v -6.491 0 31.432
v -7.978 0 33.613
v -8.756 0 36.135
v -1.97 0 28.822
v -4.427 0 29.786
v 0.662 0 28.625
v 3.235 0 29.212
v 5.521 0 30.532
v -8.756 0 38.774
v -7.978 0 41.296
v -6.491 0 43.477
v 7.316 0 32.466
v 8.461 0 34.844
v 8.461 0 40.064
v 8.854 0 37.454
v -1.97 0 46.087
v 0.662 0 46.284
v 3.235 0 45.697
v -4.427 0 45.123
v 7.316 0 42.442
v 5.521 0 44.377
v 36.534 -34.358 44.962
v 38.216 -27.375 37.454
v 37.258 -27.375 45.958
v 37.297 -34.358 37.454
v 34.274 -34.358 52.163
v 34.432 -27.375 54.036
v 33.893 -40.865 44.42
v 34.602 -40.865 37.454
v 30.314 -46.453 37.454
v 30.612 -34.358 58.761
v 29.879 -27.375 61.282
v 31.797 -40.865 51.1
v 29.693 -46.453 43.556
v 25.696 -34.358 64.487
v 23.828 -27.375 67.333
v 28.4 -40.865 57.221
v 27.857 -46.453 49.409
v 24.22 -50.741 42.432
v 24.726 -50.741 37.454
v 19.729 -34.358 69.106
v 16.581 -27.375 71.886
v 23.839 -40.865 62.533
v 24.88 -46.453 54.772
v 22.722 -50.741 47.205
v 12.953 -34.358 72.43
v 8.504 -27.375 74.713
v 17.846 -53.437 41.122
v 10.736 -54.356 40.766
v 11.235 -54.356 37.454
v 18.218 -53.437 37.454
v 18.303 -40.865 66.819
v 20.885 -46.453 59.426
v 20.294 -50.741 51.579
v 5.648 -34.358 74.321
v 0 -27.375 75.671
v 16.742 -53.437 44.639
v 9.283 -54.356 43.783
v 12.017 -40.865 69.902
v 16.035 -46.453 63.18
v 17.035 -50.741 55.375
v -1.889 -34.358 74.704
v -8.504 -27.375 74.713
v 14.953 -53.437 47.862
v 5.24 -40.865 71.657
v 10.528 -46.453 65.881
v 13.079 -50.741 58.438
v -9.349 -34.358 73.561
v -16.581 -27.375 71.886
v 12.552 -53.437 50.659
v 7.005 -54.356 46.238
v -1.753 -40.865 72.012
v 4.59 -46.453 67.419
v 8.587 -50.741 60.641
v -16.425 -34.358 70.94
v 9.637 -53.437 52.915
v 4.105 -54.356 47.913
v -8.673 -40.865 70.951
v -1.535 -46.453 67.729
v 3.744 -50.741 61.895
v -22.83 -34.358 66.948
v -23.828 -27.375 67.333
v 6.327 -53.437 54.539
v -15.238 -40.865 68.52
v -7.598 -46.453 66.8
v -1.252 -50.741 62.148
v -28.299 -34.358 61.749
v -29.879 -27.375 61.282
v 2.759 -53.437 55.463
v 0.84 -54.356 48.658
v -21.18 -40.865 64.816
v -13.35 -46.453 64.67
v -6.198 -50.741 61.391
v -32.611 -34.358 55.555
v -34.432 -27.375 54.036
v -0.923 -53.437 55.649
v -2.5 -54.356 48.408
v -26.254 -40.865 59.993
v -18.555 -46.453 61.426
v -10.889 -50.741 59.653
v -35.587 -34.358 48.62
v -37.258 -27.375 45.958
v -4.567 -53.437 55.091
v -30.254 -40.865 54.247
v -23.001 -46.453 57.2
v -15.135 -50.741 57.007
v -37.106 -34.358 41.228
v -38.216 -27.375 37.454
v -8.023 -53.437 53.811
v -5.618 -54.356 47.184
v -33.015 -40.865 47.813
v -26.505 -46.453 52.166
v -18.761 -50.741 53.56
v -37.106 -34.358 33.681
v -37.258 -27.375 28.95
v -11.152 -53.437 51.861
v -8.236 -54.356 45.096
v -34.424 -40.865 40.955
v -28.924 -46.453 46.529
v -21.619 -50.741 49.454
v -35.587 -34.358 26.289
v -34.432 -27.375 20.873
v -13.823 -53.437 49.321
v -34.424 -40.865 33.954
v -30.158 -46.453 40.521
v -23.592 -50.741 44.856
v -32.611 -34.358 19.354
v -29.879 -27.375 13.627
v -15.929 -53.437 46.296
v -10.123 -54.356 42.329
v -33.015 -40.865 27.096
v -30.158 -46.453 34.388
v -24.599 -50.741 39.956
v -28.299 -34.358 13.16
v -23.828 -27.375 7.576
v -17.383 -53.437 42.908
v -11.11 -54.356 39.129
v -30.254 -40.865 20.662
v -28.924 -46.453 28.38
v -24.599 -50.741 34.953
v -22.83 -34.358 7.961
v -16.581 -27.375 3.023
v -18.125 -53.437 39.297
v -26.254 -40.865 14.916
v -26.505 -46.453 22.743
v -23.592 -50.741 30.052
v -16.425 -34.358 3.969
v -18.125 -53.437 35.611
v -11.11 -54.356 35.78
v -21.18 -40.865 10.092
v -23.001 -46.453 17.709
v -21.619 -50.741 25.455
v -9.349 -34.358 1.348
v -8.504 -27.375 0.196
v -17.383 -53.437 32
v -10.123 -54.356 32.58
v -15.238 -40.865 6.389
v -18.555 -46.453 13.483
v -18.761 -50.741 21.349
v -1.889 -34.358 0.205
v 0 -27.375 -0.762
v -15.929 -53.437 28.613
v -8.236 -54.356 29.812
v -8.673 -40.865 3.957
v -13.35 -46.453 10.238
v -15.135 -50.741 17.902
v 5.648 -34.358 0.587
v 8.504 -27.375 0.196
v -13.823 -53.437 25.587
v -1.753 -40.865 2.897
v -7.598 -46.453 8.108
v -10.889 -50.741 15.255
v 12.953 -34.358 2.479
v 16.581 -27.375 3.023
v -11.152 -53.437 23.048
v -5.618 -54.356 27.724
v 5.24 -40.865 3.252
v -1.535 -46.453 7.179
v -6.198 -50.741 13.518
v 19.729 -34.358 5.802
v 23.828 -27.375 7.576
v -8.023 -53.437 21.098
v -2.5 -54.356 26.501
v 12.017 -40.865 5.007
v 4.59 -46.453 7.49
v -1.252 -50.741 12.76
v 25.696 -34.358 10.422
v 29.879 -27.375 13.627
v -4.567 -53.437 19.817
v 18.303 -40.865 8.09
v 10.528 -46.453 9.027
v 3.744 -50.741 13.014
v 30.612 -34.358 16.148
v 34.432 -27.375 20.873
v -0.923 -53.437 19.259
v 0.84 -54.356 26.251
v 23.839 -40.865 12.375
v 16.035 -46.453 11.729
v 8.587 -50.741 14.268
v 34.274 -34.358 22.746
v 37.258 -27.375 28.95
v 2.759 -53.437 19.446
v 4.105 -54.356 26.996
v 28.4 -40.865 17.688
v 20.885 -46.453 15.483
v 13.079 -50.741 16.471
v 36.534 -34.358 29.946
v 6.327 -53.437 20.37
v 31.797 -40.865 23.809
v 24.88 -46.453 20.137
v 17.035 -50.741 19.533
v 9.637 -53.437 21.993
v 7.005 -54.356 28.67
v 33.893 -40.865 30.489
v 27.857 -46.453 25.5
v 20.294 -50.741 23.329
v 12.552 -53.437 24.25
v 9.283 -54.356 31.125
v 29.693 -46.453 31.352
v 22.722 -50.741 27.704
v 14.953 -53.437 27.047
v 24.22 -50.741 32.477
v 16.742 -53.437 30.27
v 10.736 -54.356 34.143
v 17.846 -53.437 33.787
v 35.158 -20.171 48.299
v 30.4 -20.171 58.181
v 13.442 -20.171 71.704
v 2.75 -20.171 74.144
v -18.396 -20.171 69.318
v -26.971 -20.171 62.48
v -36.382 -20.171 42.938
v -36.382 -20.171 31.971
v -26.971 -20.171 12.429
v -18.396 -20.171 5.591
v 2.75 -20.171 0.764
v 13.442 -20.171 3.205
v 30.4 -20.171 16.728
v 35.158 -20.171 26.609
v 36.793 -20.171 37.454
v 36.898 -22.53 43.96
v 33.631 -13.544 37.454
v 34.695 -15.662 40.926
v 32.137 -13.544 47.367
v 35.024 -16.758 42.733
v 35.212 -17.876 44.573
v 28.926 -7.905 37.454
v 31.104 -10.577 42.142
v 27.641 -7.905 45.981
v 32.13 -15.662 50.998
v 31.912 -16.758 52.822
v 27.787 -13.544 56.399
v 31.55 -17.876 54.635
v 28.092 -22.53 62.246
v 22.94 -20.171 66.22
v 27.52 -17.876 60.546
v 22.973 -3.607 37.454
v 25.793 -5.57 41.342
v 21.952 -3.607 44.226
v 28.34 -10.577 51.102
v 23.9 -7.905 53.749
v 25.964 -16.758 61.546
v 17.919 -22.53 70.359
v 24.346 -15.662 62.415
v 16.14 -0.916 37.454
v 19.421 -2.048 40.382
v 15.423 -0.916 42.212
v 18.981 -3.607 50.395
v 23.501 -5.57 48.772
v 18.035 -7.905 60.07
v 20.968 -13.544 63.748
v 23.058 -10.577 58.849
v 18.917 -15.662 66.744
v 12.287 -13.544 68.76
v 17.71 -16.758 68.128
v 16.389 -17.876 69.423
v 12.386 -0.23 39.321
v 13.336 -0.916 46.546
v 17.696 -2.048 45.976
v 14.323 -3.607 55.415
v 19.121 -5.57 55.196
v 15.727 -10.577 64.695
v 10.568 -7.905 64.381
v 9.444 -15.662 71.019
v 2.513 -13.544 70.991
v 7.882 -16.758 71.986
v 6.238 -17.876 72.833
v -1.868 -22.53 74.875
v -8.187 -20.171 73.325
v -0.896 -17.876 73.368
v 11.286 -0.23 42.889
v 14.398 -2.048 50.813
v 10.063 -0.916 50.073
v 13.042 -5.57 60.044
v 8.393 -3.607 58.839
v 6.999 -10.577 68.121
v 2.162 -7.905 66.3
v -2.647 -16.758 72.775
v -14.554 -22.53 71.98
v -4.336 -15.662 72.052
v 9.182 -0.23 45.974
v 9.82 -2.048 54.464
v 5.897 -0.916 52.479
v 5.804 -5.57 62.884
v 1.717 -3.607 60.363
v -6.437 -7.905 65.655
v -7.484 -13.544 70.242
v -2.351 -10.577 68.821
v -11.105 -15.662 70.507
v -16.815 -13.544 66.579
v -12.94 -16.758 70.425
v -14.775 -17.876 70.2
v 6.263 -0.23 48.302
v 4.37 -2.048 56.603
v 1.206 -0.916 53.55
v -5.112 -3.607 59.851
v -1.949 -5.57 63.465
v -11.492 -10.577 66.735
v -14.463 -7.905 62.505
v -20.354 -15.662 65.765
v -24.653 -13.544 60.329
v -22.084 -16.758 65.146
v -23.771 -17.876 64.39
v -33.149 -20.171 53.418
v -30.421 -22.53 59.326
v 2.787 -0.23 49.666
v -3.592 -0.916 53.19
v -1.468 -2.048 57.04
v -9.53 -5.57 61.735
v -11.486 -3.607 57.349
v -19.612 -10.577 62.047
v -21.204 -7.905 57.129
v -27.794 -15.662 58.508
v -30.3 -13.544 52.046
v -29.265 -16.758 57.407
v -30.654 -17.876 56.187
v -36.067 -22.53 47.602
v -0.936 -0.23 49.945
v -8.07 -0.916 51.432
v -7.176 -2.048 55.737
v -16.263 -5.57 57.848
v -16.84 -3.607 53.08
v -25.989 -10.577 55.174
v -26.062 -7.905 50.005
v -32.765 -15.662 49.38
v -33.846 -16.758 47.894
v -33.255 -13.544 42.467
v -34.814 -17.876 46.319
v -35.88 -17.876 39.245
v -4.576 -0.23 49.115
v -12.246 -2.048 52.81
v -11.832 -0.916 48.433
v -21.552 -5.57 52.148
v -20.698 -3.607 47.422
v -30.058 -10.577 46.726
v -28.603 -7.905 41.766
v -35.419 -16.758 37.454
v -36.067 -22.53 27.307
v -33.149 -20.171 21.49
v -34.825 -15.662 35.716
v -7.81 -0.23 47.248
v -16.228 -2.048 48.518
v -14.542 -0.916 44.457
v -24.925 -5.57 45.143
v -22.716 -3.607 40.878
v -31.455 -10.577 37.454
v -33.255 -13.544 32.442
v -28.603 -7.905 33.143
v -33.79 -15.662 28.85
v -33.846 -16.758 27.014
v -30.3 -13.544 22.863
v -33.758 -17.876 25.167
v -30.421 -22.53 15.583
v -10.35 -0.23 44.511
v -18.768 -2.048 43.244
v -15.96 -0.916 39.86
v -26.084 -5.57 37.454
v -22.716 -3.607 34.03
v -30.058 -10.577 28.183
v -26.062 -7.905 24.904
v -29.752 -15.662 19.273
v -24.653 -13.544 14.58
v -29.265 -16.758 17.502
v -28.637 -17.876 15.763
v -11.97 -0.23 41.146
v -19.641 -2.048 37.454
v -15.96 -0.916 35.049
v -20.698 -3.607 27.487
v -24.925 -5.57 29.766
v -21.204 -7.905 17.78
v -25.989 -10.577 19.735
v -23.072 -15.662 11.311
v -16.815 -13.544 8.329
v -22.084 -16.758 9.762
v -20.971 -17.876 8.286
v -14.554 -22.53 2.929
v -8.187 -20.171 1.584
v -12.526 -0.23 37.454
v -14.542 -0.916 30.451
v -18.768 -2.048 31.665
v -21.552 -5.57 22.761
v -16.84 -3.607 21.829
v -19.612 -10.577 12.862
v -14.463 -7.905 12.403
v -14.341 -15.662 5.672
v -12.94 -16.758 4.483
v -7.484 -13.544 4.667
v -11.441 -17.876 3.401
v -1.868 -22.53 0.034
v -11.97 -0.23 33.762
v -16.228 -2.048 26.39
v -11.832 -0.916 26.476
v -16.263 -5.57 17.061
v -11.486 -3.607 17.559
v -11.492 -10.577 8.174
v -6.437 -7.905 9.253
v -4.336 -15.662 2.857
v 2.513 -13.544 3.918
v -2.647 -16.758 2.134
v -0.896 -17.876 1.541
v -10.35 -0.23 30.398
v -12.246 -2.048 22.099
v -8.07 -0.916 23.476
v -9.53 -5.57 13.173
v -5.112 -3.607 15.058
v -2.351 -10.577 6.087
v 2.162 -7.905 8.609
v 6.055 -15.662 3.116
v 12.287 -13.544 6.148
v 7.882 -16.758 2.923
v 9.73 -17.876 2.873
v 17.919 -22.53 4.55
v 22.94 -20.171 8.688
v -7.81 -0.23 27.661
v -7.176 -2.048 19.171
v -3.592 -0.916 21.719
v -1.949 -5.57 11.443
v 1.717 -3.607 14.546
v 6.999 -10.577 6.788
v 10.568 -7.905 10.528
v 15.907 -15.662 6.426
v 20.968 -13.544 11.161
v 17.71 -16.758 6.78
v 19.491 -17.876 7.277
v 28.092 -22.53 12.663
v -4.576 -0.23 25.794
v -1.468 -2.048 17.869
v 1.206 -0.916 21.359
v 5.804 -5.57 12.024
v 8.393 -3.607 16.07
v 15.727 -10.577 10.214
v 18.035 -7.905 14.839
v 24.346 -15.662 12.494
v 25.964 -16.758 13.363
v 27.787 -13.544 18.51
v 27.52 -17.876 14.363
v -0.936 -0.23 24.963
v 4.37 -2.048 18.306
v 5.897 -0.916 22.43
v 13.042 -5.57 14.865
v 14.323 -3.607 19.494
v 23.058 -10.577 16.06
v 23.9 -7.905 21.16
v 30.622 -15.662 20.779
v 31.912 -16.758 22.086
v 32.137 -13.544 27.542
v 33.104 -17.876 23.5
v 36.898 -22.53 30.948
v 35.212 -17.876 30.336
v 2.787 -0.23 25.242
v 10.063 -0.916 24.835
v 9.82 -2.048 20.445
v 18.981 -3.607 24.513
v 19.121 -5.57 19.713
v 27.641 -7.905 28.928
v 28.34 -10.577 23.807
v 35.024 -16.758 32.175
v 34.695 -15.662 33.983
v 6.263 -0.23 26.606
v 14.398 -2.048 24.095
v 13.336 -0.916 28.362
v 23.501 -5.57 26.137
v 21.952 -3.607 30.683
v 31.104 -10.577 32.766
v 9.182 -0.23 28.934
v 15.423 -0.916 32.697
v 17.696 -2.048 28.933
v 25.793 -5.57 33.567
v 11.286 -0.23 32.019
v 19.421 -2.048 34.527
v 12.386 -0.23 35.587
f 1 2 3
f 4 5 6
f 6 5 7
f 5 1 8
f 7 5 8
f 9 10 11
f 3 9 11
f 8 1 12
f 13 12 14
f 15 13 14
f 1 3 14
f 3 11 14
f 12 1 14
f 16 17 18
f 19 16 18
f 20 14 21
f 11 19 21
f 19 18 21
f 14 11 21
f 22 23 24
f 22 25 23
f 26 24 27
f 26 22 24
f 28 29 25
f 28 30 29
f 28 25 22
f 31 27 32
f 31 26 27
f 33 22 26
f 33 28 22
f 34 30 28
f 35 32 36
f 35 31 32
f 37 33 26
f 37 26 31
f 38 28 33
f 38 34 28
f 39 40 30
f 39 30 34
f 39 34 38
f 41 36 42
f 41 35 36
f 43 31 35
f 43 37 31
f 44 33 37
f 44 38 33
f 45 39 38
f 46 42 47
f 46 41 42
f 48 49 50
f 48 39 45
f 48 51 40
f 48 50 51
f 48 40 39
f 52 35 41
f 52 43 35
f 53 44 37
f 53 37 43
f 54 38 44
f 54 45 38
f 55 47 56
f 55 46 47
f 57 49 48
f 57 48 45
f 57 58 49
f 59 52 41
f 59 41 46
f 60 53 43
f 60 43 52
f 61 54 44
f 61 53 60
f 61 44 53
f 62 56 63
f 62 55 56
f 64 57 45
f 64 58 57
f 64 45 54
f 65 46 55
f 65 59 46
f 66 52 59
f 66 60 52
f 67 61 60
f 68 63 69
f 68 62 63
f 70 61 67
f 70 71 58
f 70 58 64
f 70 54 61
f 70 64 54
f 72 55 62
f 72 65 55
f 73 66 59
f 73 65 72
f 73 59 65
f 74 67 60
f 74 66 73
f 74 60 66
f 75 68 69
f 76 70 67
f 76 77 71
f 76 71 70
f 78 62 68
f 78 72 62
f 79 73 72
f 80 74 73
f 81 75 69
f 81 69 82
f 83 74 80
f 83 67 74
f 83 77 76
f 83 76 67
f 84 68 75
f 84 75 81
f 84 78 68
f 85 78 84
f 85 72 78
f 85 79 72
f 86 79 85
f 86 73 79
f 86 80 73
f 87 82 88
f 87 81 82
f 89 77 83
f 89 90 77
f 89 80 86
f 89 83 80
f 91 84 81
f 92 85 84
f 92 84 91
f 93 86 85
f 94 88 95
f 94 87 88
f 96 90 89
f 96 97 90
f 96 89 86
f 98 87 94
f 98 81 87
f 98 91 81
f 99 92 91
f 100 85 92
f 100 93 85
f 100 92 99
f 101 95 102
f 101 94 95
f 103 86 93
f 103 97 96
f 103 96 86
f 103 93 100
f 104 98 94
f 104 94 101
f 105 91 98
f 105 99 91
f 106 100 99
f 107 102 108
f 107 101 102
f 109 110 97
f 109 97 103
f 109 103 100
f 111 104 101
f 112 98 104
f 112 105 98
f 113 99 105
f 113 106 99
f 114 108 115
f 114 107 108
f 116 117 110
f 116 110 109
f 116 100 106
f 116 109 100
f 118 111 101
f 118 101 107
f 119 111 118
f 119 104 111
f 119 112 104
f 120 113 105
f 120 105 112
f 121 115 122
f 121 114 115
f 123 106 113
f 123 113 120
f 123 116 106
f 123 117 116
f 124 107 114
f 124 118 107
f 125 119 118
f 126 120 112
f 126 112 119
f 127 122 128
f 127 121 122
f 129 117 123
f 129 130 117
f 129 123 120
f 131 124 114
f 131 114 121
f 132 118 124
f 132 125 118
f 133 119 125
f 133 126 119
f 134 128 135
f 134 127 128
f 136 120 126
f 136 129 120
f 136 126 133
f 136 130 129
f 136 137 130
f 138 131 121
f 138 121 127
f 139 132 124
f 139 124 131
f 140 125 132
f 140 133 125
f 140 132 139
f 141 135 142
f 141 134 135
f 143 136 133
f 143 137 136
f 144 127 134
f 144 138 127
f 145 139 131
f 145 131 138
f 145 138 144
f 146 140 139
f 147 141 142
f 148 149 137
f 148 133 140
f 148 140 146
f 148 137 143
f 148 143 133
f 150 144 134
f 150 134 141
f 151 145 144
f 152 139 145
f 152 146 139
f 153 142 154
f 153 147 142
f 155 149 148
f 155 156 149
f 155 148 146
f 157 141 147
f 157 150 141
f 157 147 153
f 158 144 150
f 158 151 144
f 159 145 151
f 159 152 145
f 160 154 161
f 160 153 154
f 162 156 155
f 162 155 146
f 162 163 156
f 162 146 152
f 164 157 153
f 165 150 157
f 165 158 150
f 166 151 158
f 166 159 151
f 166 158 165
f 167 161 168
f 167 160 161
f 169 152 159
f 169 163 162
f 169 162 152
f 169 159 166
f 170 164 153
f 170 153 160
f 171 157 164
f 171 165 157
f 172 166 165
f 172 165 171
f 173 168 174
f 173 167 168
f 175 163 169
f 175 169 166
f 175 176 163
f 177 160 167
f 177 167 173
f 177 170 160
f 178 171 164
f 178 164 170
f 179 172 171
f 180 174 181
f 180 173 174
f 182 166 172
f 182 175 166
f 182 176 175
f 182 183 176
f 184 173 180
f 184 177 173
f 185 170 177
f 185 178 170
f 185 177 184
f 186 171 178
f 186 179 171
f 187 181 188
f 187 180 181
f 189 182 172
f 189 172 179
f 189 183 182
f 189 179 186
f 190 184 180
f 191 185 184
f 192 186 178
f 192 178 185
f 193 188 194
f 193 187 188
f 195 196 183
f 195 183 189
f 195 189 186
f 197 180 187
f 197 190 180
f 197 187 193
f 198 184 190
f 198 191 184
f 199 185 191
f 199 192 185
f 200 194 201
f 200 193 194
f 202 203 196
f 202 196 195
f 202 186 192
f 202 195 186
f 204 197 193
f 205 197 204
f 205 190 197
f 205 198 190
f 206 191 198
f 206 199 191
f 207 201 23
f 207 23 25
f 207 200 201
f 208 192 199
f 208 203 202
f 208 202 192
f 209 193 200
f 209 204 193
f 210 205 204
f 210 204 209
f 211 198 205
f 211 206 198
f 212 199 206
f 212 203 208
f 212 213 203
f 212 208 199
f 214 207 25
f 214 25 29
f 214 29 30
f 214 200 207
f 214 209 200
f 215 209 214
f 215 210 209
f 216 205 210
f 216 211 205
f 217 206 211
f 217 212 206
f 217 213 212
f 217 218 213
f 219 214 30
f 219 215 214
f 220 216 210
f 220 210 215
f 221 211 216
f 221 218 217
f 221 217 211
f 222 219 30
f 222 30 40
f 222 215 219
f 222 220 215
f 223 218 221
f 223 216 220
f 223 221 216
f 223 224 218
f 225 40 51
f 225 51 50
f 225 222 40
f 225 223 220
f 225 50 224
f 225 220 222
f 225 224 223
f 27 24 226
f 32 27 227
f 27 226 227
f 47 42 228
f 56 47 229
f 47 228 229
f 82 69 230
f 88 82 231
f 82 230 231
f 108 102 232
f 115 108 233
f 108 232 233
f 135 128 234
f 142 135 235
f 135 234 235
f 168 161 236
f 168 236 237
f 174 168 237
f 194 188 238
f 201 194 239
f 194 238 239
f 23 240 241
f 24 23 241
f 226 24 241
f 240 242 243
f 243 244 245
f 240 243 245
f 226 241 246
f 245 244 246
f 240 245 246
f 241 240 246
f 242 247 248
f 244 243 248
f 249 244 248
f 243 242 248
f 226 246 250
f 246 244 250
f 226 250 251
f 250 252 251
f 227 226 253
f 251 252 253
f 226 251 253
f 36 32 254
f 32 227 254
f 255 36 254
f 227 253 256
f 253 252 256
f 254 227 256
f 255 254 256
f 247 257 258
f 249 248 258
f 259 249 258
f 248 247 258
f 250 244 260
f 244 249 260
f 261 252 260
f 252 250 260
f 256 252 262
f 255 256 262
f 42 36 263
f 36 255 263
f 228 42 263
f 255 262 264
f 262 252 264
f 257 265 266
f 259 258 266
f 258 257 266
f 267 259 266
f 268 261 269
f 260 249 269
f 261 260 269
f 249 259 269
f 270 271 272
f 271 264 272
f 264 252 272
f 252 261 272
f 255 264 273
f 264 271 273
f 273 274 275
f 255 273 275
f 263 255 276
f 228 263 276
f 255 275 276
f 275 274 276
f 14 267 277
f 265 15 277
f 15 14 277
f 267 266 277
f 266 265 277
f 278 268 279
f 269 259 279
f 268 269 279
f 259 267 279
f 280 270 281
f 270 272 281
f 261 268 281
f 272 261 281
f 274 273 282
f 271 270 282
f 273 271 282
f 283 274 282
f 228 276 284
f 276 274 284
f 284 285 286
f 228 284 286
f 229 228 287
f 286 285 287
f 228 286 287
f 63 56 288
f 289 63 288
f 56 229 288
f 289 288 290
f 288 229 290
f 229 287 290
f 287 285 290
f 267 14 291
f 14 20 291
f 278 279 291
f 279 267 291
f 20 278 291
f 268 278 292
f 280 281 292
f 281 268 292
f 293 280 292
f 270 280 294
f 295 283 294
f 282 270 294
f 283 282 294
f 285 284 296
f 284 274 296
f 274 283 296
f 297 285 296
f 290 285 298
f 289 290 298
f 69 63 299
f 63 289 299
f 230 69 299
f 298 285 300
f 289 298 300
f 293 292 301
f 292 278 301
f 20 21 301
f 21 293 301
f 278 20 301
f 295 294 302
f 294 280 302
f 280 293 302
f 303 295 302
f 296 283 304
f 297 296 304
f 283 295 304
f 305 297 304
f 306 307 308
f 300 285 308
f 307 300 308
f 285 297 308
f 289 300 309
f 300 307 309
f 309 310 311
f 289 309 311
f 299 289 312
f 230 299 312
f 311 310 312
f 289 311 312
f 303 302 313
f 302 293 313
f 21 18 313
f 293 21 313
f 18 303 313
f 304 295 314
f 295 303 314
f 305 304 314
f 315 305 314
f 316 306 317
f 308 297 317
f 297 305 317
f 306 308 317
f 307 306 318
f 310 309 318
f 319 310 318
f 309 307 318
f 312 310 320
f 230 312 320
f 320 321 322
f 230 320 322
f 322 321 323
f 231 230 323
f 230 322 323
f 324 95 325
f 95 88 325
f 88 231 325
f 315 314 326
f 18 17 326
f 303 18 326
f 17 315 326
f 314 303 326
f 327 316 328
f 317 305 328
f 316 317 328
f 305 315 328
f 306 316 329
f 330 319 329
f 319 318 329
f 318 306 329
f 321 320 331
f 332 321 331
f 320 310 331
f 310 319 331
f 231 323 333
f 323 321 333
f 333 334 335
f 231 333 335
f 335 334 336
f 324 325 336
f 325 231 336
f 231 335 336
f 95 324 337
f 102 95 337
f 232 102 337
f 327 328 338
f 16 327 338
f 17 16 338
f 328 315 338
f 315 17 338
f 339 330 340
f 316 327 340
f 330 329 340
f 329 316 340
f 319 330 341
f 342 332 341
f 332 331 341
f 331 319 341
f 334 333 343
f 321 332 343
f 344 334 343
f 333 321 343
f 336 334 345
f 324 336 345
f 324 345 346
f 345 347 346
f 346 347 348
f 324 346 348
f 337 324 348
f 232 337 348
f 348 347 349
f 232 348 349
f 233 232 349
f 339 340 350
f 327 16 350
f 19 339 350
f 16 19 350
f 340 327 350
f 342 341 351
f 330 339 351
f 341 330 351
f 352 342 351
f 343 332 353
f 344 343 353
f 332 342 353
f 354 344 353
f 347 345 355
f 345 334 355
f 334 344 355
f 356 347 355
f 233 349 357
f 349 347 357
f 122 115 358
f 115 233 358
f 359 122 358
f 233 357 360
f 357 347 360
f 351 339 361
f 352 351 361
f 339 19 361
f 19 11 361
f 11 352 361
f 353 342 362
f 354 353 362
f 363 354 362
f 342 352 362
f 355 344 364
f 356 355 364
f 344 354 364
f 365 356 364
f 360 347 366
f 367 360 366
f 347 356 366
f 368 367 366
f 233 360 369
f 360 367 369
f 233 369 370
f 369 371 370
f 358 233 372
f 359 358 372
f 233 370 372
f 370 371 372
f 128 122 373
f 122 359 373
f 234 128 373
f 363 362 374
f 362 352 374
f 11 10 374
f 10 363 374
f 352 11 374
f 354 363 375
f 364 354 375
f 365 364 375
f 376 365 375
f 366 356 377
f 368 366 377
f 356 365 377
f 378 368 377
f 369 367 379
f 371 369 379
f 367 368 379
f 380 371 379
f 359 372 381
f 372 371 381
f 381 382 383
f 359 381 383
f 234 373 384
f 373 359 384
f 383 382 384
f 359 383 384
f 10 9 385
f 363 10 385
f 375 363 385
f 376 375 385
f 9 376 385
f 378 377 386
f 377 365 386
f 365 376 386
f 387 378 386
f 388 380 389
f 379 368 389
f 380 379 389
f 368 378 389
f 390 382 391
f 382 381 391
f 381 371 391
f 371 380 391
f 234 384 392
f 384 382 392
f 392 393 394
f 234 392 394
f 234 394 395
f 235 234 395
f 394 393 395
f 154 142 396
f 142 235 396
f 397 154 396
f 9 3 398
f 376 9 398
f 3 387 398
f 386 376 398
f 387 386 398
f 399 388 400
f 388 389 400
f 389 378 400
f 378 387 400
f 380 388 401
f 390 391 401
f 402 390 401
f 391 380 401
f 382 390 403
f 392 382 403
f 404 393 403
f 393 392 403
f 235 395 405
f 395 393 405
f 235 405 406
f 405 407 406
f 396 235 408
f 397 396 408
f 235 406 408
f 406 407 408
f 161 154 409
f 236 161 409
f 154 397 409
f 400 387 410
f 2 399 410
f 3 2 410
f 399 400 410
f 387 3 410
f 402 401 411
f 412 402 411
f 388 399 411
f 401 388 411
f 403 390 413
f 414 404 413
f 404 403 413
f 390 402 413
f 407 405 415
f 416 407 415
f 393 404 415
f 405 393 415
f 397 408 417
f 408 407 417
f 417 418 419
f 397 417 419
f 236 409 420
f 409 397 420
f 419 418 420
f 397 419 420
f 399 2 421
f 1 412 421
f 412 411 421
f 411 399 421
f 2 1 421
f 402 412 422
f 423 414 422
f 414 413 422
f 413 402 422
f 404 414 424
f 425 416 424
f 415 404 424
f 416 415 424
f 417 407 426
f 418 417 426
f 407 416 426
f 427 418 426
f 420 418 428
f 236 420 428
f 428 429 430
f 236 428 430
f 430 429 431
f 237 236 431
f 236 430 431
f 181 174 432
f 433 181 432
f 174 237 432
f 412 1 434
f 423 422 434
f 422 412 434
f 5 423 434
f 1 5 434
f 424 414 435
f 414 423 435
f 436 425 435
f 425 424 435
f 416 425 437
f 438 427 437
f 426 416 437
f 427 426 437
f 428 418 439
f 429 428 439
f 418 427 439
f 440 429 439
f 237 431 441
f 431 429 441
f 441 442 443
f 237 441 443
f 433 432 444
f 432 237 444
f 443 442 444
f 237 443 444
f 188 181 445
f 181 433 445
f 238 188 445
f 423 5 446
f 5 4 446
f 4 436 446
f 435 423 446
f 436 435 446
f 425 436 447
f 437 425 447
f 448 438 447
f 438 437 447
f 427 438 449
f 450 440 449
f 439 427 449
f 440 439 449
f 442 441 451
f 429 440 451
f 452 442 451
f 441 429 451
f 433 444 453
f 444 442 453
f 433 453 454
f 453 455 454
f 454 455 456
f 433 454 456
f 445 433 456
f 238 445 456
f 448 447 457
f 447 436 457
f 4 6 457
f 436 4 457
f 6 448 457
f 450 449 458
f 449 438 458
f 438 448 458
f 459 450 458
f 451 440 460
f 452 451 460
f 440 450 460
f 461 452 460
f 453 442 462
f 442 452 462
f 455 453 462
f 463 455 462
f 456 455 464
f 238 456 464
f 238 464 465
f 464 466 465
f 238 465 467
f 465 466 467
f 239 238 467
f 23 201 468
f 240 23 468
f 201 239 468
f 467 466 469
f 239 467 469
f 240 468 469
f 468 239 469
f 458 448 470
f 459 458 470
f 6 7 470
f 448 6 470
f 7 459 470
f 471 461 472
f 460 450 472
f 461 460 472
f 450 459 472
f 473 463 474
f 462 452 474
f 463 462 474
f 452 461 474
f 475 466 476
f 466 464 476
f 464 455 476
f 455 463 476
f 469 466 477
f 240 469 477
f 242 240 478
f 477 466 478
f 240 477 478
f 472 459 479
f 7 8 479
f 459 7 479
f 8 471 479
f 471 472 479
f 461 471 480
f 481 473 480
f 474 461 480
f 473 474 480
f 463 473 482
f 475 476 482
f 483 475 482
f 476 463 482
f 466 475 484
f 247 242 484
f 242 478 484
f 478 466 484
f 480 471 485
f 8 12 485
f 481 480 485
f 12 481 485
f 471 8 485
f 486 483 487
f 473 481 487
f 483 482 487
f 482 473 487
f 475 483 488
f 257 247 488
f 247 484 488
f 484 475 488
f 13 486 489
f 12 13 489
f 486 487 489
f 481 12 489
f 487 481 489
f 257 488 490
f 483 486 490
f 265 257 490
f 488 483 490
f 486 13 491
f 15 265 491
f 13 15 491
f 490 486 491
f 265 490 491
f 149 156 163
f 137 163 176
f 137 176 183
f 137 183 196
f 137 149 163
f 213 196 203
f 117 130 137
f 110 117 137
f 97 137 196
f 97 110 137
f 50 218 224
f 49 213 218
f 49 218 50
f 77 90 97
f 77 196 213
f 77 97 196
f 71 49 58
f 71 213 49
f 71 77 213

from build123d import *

# Parameters (mm, degrees)
F0_R     = 38.216457182
F1_DEPTH = 54.356
F2_R     = 26.9812507731


# Not quite as in the source:
# - a fillet or chamfer that OpenCascade refuses, or shapes differently, is made with other operations: its cross-section is extruded or revolved along the edge and cut away or added


with BuildPart() as f1:
    # F0 (on Front) → F1 (new body)
    with BuildSketch(Plane.XZ):
        with Locations((0, 37.4543480575)):
            Circle(F0_R)
    extrude(amount=F1_DEPTH)

    # F2
    f2_edges = [f1.edges().sort_by_distance(p)[0] for p in [
        (-38.216457, -54.356, 37.454348),
    ]]
    fillet(f2_edges, radius=F2_R)

    # F3: fillet of radius 29.4340917525 on 1 edges, made by hand

    # F3_s1 → F3_t2 (revolve, cut)
    with BuildSketch(Plane.XY.offset(37.4543480575)):
        with BuildLine():
            ThreePointArc((38.216457182, -27.3747492269), (28.9262515546, -7.9052664926), (8.8544942767, 0))
            Line((8.8544942767, 0), (8.8544942767, 0.588681835))
            Line((8.8544942767, 0.588681835), (38.216457182, 0.588681835))
            Line((38.216457182, 0.588681835), (38.8051390171, 0))
            ThreePointArc((38.8051390171, 0), (38.8051390171, -13.6873746135), (38.8036964401, -27.3335623764))
            Line((38.8036964401, -27.3335623764), (38.216457182, -27.3747492269))
        make_face()
    revolve(axis=Axis((0, 0, 37.4543480575), (0, -1, 0)), mode=Mode.SUBTRACT)


solid = f1.part
